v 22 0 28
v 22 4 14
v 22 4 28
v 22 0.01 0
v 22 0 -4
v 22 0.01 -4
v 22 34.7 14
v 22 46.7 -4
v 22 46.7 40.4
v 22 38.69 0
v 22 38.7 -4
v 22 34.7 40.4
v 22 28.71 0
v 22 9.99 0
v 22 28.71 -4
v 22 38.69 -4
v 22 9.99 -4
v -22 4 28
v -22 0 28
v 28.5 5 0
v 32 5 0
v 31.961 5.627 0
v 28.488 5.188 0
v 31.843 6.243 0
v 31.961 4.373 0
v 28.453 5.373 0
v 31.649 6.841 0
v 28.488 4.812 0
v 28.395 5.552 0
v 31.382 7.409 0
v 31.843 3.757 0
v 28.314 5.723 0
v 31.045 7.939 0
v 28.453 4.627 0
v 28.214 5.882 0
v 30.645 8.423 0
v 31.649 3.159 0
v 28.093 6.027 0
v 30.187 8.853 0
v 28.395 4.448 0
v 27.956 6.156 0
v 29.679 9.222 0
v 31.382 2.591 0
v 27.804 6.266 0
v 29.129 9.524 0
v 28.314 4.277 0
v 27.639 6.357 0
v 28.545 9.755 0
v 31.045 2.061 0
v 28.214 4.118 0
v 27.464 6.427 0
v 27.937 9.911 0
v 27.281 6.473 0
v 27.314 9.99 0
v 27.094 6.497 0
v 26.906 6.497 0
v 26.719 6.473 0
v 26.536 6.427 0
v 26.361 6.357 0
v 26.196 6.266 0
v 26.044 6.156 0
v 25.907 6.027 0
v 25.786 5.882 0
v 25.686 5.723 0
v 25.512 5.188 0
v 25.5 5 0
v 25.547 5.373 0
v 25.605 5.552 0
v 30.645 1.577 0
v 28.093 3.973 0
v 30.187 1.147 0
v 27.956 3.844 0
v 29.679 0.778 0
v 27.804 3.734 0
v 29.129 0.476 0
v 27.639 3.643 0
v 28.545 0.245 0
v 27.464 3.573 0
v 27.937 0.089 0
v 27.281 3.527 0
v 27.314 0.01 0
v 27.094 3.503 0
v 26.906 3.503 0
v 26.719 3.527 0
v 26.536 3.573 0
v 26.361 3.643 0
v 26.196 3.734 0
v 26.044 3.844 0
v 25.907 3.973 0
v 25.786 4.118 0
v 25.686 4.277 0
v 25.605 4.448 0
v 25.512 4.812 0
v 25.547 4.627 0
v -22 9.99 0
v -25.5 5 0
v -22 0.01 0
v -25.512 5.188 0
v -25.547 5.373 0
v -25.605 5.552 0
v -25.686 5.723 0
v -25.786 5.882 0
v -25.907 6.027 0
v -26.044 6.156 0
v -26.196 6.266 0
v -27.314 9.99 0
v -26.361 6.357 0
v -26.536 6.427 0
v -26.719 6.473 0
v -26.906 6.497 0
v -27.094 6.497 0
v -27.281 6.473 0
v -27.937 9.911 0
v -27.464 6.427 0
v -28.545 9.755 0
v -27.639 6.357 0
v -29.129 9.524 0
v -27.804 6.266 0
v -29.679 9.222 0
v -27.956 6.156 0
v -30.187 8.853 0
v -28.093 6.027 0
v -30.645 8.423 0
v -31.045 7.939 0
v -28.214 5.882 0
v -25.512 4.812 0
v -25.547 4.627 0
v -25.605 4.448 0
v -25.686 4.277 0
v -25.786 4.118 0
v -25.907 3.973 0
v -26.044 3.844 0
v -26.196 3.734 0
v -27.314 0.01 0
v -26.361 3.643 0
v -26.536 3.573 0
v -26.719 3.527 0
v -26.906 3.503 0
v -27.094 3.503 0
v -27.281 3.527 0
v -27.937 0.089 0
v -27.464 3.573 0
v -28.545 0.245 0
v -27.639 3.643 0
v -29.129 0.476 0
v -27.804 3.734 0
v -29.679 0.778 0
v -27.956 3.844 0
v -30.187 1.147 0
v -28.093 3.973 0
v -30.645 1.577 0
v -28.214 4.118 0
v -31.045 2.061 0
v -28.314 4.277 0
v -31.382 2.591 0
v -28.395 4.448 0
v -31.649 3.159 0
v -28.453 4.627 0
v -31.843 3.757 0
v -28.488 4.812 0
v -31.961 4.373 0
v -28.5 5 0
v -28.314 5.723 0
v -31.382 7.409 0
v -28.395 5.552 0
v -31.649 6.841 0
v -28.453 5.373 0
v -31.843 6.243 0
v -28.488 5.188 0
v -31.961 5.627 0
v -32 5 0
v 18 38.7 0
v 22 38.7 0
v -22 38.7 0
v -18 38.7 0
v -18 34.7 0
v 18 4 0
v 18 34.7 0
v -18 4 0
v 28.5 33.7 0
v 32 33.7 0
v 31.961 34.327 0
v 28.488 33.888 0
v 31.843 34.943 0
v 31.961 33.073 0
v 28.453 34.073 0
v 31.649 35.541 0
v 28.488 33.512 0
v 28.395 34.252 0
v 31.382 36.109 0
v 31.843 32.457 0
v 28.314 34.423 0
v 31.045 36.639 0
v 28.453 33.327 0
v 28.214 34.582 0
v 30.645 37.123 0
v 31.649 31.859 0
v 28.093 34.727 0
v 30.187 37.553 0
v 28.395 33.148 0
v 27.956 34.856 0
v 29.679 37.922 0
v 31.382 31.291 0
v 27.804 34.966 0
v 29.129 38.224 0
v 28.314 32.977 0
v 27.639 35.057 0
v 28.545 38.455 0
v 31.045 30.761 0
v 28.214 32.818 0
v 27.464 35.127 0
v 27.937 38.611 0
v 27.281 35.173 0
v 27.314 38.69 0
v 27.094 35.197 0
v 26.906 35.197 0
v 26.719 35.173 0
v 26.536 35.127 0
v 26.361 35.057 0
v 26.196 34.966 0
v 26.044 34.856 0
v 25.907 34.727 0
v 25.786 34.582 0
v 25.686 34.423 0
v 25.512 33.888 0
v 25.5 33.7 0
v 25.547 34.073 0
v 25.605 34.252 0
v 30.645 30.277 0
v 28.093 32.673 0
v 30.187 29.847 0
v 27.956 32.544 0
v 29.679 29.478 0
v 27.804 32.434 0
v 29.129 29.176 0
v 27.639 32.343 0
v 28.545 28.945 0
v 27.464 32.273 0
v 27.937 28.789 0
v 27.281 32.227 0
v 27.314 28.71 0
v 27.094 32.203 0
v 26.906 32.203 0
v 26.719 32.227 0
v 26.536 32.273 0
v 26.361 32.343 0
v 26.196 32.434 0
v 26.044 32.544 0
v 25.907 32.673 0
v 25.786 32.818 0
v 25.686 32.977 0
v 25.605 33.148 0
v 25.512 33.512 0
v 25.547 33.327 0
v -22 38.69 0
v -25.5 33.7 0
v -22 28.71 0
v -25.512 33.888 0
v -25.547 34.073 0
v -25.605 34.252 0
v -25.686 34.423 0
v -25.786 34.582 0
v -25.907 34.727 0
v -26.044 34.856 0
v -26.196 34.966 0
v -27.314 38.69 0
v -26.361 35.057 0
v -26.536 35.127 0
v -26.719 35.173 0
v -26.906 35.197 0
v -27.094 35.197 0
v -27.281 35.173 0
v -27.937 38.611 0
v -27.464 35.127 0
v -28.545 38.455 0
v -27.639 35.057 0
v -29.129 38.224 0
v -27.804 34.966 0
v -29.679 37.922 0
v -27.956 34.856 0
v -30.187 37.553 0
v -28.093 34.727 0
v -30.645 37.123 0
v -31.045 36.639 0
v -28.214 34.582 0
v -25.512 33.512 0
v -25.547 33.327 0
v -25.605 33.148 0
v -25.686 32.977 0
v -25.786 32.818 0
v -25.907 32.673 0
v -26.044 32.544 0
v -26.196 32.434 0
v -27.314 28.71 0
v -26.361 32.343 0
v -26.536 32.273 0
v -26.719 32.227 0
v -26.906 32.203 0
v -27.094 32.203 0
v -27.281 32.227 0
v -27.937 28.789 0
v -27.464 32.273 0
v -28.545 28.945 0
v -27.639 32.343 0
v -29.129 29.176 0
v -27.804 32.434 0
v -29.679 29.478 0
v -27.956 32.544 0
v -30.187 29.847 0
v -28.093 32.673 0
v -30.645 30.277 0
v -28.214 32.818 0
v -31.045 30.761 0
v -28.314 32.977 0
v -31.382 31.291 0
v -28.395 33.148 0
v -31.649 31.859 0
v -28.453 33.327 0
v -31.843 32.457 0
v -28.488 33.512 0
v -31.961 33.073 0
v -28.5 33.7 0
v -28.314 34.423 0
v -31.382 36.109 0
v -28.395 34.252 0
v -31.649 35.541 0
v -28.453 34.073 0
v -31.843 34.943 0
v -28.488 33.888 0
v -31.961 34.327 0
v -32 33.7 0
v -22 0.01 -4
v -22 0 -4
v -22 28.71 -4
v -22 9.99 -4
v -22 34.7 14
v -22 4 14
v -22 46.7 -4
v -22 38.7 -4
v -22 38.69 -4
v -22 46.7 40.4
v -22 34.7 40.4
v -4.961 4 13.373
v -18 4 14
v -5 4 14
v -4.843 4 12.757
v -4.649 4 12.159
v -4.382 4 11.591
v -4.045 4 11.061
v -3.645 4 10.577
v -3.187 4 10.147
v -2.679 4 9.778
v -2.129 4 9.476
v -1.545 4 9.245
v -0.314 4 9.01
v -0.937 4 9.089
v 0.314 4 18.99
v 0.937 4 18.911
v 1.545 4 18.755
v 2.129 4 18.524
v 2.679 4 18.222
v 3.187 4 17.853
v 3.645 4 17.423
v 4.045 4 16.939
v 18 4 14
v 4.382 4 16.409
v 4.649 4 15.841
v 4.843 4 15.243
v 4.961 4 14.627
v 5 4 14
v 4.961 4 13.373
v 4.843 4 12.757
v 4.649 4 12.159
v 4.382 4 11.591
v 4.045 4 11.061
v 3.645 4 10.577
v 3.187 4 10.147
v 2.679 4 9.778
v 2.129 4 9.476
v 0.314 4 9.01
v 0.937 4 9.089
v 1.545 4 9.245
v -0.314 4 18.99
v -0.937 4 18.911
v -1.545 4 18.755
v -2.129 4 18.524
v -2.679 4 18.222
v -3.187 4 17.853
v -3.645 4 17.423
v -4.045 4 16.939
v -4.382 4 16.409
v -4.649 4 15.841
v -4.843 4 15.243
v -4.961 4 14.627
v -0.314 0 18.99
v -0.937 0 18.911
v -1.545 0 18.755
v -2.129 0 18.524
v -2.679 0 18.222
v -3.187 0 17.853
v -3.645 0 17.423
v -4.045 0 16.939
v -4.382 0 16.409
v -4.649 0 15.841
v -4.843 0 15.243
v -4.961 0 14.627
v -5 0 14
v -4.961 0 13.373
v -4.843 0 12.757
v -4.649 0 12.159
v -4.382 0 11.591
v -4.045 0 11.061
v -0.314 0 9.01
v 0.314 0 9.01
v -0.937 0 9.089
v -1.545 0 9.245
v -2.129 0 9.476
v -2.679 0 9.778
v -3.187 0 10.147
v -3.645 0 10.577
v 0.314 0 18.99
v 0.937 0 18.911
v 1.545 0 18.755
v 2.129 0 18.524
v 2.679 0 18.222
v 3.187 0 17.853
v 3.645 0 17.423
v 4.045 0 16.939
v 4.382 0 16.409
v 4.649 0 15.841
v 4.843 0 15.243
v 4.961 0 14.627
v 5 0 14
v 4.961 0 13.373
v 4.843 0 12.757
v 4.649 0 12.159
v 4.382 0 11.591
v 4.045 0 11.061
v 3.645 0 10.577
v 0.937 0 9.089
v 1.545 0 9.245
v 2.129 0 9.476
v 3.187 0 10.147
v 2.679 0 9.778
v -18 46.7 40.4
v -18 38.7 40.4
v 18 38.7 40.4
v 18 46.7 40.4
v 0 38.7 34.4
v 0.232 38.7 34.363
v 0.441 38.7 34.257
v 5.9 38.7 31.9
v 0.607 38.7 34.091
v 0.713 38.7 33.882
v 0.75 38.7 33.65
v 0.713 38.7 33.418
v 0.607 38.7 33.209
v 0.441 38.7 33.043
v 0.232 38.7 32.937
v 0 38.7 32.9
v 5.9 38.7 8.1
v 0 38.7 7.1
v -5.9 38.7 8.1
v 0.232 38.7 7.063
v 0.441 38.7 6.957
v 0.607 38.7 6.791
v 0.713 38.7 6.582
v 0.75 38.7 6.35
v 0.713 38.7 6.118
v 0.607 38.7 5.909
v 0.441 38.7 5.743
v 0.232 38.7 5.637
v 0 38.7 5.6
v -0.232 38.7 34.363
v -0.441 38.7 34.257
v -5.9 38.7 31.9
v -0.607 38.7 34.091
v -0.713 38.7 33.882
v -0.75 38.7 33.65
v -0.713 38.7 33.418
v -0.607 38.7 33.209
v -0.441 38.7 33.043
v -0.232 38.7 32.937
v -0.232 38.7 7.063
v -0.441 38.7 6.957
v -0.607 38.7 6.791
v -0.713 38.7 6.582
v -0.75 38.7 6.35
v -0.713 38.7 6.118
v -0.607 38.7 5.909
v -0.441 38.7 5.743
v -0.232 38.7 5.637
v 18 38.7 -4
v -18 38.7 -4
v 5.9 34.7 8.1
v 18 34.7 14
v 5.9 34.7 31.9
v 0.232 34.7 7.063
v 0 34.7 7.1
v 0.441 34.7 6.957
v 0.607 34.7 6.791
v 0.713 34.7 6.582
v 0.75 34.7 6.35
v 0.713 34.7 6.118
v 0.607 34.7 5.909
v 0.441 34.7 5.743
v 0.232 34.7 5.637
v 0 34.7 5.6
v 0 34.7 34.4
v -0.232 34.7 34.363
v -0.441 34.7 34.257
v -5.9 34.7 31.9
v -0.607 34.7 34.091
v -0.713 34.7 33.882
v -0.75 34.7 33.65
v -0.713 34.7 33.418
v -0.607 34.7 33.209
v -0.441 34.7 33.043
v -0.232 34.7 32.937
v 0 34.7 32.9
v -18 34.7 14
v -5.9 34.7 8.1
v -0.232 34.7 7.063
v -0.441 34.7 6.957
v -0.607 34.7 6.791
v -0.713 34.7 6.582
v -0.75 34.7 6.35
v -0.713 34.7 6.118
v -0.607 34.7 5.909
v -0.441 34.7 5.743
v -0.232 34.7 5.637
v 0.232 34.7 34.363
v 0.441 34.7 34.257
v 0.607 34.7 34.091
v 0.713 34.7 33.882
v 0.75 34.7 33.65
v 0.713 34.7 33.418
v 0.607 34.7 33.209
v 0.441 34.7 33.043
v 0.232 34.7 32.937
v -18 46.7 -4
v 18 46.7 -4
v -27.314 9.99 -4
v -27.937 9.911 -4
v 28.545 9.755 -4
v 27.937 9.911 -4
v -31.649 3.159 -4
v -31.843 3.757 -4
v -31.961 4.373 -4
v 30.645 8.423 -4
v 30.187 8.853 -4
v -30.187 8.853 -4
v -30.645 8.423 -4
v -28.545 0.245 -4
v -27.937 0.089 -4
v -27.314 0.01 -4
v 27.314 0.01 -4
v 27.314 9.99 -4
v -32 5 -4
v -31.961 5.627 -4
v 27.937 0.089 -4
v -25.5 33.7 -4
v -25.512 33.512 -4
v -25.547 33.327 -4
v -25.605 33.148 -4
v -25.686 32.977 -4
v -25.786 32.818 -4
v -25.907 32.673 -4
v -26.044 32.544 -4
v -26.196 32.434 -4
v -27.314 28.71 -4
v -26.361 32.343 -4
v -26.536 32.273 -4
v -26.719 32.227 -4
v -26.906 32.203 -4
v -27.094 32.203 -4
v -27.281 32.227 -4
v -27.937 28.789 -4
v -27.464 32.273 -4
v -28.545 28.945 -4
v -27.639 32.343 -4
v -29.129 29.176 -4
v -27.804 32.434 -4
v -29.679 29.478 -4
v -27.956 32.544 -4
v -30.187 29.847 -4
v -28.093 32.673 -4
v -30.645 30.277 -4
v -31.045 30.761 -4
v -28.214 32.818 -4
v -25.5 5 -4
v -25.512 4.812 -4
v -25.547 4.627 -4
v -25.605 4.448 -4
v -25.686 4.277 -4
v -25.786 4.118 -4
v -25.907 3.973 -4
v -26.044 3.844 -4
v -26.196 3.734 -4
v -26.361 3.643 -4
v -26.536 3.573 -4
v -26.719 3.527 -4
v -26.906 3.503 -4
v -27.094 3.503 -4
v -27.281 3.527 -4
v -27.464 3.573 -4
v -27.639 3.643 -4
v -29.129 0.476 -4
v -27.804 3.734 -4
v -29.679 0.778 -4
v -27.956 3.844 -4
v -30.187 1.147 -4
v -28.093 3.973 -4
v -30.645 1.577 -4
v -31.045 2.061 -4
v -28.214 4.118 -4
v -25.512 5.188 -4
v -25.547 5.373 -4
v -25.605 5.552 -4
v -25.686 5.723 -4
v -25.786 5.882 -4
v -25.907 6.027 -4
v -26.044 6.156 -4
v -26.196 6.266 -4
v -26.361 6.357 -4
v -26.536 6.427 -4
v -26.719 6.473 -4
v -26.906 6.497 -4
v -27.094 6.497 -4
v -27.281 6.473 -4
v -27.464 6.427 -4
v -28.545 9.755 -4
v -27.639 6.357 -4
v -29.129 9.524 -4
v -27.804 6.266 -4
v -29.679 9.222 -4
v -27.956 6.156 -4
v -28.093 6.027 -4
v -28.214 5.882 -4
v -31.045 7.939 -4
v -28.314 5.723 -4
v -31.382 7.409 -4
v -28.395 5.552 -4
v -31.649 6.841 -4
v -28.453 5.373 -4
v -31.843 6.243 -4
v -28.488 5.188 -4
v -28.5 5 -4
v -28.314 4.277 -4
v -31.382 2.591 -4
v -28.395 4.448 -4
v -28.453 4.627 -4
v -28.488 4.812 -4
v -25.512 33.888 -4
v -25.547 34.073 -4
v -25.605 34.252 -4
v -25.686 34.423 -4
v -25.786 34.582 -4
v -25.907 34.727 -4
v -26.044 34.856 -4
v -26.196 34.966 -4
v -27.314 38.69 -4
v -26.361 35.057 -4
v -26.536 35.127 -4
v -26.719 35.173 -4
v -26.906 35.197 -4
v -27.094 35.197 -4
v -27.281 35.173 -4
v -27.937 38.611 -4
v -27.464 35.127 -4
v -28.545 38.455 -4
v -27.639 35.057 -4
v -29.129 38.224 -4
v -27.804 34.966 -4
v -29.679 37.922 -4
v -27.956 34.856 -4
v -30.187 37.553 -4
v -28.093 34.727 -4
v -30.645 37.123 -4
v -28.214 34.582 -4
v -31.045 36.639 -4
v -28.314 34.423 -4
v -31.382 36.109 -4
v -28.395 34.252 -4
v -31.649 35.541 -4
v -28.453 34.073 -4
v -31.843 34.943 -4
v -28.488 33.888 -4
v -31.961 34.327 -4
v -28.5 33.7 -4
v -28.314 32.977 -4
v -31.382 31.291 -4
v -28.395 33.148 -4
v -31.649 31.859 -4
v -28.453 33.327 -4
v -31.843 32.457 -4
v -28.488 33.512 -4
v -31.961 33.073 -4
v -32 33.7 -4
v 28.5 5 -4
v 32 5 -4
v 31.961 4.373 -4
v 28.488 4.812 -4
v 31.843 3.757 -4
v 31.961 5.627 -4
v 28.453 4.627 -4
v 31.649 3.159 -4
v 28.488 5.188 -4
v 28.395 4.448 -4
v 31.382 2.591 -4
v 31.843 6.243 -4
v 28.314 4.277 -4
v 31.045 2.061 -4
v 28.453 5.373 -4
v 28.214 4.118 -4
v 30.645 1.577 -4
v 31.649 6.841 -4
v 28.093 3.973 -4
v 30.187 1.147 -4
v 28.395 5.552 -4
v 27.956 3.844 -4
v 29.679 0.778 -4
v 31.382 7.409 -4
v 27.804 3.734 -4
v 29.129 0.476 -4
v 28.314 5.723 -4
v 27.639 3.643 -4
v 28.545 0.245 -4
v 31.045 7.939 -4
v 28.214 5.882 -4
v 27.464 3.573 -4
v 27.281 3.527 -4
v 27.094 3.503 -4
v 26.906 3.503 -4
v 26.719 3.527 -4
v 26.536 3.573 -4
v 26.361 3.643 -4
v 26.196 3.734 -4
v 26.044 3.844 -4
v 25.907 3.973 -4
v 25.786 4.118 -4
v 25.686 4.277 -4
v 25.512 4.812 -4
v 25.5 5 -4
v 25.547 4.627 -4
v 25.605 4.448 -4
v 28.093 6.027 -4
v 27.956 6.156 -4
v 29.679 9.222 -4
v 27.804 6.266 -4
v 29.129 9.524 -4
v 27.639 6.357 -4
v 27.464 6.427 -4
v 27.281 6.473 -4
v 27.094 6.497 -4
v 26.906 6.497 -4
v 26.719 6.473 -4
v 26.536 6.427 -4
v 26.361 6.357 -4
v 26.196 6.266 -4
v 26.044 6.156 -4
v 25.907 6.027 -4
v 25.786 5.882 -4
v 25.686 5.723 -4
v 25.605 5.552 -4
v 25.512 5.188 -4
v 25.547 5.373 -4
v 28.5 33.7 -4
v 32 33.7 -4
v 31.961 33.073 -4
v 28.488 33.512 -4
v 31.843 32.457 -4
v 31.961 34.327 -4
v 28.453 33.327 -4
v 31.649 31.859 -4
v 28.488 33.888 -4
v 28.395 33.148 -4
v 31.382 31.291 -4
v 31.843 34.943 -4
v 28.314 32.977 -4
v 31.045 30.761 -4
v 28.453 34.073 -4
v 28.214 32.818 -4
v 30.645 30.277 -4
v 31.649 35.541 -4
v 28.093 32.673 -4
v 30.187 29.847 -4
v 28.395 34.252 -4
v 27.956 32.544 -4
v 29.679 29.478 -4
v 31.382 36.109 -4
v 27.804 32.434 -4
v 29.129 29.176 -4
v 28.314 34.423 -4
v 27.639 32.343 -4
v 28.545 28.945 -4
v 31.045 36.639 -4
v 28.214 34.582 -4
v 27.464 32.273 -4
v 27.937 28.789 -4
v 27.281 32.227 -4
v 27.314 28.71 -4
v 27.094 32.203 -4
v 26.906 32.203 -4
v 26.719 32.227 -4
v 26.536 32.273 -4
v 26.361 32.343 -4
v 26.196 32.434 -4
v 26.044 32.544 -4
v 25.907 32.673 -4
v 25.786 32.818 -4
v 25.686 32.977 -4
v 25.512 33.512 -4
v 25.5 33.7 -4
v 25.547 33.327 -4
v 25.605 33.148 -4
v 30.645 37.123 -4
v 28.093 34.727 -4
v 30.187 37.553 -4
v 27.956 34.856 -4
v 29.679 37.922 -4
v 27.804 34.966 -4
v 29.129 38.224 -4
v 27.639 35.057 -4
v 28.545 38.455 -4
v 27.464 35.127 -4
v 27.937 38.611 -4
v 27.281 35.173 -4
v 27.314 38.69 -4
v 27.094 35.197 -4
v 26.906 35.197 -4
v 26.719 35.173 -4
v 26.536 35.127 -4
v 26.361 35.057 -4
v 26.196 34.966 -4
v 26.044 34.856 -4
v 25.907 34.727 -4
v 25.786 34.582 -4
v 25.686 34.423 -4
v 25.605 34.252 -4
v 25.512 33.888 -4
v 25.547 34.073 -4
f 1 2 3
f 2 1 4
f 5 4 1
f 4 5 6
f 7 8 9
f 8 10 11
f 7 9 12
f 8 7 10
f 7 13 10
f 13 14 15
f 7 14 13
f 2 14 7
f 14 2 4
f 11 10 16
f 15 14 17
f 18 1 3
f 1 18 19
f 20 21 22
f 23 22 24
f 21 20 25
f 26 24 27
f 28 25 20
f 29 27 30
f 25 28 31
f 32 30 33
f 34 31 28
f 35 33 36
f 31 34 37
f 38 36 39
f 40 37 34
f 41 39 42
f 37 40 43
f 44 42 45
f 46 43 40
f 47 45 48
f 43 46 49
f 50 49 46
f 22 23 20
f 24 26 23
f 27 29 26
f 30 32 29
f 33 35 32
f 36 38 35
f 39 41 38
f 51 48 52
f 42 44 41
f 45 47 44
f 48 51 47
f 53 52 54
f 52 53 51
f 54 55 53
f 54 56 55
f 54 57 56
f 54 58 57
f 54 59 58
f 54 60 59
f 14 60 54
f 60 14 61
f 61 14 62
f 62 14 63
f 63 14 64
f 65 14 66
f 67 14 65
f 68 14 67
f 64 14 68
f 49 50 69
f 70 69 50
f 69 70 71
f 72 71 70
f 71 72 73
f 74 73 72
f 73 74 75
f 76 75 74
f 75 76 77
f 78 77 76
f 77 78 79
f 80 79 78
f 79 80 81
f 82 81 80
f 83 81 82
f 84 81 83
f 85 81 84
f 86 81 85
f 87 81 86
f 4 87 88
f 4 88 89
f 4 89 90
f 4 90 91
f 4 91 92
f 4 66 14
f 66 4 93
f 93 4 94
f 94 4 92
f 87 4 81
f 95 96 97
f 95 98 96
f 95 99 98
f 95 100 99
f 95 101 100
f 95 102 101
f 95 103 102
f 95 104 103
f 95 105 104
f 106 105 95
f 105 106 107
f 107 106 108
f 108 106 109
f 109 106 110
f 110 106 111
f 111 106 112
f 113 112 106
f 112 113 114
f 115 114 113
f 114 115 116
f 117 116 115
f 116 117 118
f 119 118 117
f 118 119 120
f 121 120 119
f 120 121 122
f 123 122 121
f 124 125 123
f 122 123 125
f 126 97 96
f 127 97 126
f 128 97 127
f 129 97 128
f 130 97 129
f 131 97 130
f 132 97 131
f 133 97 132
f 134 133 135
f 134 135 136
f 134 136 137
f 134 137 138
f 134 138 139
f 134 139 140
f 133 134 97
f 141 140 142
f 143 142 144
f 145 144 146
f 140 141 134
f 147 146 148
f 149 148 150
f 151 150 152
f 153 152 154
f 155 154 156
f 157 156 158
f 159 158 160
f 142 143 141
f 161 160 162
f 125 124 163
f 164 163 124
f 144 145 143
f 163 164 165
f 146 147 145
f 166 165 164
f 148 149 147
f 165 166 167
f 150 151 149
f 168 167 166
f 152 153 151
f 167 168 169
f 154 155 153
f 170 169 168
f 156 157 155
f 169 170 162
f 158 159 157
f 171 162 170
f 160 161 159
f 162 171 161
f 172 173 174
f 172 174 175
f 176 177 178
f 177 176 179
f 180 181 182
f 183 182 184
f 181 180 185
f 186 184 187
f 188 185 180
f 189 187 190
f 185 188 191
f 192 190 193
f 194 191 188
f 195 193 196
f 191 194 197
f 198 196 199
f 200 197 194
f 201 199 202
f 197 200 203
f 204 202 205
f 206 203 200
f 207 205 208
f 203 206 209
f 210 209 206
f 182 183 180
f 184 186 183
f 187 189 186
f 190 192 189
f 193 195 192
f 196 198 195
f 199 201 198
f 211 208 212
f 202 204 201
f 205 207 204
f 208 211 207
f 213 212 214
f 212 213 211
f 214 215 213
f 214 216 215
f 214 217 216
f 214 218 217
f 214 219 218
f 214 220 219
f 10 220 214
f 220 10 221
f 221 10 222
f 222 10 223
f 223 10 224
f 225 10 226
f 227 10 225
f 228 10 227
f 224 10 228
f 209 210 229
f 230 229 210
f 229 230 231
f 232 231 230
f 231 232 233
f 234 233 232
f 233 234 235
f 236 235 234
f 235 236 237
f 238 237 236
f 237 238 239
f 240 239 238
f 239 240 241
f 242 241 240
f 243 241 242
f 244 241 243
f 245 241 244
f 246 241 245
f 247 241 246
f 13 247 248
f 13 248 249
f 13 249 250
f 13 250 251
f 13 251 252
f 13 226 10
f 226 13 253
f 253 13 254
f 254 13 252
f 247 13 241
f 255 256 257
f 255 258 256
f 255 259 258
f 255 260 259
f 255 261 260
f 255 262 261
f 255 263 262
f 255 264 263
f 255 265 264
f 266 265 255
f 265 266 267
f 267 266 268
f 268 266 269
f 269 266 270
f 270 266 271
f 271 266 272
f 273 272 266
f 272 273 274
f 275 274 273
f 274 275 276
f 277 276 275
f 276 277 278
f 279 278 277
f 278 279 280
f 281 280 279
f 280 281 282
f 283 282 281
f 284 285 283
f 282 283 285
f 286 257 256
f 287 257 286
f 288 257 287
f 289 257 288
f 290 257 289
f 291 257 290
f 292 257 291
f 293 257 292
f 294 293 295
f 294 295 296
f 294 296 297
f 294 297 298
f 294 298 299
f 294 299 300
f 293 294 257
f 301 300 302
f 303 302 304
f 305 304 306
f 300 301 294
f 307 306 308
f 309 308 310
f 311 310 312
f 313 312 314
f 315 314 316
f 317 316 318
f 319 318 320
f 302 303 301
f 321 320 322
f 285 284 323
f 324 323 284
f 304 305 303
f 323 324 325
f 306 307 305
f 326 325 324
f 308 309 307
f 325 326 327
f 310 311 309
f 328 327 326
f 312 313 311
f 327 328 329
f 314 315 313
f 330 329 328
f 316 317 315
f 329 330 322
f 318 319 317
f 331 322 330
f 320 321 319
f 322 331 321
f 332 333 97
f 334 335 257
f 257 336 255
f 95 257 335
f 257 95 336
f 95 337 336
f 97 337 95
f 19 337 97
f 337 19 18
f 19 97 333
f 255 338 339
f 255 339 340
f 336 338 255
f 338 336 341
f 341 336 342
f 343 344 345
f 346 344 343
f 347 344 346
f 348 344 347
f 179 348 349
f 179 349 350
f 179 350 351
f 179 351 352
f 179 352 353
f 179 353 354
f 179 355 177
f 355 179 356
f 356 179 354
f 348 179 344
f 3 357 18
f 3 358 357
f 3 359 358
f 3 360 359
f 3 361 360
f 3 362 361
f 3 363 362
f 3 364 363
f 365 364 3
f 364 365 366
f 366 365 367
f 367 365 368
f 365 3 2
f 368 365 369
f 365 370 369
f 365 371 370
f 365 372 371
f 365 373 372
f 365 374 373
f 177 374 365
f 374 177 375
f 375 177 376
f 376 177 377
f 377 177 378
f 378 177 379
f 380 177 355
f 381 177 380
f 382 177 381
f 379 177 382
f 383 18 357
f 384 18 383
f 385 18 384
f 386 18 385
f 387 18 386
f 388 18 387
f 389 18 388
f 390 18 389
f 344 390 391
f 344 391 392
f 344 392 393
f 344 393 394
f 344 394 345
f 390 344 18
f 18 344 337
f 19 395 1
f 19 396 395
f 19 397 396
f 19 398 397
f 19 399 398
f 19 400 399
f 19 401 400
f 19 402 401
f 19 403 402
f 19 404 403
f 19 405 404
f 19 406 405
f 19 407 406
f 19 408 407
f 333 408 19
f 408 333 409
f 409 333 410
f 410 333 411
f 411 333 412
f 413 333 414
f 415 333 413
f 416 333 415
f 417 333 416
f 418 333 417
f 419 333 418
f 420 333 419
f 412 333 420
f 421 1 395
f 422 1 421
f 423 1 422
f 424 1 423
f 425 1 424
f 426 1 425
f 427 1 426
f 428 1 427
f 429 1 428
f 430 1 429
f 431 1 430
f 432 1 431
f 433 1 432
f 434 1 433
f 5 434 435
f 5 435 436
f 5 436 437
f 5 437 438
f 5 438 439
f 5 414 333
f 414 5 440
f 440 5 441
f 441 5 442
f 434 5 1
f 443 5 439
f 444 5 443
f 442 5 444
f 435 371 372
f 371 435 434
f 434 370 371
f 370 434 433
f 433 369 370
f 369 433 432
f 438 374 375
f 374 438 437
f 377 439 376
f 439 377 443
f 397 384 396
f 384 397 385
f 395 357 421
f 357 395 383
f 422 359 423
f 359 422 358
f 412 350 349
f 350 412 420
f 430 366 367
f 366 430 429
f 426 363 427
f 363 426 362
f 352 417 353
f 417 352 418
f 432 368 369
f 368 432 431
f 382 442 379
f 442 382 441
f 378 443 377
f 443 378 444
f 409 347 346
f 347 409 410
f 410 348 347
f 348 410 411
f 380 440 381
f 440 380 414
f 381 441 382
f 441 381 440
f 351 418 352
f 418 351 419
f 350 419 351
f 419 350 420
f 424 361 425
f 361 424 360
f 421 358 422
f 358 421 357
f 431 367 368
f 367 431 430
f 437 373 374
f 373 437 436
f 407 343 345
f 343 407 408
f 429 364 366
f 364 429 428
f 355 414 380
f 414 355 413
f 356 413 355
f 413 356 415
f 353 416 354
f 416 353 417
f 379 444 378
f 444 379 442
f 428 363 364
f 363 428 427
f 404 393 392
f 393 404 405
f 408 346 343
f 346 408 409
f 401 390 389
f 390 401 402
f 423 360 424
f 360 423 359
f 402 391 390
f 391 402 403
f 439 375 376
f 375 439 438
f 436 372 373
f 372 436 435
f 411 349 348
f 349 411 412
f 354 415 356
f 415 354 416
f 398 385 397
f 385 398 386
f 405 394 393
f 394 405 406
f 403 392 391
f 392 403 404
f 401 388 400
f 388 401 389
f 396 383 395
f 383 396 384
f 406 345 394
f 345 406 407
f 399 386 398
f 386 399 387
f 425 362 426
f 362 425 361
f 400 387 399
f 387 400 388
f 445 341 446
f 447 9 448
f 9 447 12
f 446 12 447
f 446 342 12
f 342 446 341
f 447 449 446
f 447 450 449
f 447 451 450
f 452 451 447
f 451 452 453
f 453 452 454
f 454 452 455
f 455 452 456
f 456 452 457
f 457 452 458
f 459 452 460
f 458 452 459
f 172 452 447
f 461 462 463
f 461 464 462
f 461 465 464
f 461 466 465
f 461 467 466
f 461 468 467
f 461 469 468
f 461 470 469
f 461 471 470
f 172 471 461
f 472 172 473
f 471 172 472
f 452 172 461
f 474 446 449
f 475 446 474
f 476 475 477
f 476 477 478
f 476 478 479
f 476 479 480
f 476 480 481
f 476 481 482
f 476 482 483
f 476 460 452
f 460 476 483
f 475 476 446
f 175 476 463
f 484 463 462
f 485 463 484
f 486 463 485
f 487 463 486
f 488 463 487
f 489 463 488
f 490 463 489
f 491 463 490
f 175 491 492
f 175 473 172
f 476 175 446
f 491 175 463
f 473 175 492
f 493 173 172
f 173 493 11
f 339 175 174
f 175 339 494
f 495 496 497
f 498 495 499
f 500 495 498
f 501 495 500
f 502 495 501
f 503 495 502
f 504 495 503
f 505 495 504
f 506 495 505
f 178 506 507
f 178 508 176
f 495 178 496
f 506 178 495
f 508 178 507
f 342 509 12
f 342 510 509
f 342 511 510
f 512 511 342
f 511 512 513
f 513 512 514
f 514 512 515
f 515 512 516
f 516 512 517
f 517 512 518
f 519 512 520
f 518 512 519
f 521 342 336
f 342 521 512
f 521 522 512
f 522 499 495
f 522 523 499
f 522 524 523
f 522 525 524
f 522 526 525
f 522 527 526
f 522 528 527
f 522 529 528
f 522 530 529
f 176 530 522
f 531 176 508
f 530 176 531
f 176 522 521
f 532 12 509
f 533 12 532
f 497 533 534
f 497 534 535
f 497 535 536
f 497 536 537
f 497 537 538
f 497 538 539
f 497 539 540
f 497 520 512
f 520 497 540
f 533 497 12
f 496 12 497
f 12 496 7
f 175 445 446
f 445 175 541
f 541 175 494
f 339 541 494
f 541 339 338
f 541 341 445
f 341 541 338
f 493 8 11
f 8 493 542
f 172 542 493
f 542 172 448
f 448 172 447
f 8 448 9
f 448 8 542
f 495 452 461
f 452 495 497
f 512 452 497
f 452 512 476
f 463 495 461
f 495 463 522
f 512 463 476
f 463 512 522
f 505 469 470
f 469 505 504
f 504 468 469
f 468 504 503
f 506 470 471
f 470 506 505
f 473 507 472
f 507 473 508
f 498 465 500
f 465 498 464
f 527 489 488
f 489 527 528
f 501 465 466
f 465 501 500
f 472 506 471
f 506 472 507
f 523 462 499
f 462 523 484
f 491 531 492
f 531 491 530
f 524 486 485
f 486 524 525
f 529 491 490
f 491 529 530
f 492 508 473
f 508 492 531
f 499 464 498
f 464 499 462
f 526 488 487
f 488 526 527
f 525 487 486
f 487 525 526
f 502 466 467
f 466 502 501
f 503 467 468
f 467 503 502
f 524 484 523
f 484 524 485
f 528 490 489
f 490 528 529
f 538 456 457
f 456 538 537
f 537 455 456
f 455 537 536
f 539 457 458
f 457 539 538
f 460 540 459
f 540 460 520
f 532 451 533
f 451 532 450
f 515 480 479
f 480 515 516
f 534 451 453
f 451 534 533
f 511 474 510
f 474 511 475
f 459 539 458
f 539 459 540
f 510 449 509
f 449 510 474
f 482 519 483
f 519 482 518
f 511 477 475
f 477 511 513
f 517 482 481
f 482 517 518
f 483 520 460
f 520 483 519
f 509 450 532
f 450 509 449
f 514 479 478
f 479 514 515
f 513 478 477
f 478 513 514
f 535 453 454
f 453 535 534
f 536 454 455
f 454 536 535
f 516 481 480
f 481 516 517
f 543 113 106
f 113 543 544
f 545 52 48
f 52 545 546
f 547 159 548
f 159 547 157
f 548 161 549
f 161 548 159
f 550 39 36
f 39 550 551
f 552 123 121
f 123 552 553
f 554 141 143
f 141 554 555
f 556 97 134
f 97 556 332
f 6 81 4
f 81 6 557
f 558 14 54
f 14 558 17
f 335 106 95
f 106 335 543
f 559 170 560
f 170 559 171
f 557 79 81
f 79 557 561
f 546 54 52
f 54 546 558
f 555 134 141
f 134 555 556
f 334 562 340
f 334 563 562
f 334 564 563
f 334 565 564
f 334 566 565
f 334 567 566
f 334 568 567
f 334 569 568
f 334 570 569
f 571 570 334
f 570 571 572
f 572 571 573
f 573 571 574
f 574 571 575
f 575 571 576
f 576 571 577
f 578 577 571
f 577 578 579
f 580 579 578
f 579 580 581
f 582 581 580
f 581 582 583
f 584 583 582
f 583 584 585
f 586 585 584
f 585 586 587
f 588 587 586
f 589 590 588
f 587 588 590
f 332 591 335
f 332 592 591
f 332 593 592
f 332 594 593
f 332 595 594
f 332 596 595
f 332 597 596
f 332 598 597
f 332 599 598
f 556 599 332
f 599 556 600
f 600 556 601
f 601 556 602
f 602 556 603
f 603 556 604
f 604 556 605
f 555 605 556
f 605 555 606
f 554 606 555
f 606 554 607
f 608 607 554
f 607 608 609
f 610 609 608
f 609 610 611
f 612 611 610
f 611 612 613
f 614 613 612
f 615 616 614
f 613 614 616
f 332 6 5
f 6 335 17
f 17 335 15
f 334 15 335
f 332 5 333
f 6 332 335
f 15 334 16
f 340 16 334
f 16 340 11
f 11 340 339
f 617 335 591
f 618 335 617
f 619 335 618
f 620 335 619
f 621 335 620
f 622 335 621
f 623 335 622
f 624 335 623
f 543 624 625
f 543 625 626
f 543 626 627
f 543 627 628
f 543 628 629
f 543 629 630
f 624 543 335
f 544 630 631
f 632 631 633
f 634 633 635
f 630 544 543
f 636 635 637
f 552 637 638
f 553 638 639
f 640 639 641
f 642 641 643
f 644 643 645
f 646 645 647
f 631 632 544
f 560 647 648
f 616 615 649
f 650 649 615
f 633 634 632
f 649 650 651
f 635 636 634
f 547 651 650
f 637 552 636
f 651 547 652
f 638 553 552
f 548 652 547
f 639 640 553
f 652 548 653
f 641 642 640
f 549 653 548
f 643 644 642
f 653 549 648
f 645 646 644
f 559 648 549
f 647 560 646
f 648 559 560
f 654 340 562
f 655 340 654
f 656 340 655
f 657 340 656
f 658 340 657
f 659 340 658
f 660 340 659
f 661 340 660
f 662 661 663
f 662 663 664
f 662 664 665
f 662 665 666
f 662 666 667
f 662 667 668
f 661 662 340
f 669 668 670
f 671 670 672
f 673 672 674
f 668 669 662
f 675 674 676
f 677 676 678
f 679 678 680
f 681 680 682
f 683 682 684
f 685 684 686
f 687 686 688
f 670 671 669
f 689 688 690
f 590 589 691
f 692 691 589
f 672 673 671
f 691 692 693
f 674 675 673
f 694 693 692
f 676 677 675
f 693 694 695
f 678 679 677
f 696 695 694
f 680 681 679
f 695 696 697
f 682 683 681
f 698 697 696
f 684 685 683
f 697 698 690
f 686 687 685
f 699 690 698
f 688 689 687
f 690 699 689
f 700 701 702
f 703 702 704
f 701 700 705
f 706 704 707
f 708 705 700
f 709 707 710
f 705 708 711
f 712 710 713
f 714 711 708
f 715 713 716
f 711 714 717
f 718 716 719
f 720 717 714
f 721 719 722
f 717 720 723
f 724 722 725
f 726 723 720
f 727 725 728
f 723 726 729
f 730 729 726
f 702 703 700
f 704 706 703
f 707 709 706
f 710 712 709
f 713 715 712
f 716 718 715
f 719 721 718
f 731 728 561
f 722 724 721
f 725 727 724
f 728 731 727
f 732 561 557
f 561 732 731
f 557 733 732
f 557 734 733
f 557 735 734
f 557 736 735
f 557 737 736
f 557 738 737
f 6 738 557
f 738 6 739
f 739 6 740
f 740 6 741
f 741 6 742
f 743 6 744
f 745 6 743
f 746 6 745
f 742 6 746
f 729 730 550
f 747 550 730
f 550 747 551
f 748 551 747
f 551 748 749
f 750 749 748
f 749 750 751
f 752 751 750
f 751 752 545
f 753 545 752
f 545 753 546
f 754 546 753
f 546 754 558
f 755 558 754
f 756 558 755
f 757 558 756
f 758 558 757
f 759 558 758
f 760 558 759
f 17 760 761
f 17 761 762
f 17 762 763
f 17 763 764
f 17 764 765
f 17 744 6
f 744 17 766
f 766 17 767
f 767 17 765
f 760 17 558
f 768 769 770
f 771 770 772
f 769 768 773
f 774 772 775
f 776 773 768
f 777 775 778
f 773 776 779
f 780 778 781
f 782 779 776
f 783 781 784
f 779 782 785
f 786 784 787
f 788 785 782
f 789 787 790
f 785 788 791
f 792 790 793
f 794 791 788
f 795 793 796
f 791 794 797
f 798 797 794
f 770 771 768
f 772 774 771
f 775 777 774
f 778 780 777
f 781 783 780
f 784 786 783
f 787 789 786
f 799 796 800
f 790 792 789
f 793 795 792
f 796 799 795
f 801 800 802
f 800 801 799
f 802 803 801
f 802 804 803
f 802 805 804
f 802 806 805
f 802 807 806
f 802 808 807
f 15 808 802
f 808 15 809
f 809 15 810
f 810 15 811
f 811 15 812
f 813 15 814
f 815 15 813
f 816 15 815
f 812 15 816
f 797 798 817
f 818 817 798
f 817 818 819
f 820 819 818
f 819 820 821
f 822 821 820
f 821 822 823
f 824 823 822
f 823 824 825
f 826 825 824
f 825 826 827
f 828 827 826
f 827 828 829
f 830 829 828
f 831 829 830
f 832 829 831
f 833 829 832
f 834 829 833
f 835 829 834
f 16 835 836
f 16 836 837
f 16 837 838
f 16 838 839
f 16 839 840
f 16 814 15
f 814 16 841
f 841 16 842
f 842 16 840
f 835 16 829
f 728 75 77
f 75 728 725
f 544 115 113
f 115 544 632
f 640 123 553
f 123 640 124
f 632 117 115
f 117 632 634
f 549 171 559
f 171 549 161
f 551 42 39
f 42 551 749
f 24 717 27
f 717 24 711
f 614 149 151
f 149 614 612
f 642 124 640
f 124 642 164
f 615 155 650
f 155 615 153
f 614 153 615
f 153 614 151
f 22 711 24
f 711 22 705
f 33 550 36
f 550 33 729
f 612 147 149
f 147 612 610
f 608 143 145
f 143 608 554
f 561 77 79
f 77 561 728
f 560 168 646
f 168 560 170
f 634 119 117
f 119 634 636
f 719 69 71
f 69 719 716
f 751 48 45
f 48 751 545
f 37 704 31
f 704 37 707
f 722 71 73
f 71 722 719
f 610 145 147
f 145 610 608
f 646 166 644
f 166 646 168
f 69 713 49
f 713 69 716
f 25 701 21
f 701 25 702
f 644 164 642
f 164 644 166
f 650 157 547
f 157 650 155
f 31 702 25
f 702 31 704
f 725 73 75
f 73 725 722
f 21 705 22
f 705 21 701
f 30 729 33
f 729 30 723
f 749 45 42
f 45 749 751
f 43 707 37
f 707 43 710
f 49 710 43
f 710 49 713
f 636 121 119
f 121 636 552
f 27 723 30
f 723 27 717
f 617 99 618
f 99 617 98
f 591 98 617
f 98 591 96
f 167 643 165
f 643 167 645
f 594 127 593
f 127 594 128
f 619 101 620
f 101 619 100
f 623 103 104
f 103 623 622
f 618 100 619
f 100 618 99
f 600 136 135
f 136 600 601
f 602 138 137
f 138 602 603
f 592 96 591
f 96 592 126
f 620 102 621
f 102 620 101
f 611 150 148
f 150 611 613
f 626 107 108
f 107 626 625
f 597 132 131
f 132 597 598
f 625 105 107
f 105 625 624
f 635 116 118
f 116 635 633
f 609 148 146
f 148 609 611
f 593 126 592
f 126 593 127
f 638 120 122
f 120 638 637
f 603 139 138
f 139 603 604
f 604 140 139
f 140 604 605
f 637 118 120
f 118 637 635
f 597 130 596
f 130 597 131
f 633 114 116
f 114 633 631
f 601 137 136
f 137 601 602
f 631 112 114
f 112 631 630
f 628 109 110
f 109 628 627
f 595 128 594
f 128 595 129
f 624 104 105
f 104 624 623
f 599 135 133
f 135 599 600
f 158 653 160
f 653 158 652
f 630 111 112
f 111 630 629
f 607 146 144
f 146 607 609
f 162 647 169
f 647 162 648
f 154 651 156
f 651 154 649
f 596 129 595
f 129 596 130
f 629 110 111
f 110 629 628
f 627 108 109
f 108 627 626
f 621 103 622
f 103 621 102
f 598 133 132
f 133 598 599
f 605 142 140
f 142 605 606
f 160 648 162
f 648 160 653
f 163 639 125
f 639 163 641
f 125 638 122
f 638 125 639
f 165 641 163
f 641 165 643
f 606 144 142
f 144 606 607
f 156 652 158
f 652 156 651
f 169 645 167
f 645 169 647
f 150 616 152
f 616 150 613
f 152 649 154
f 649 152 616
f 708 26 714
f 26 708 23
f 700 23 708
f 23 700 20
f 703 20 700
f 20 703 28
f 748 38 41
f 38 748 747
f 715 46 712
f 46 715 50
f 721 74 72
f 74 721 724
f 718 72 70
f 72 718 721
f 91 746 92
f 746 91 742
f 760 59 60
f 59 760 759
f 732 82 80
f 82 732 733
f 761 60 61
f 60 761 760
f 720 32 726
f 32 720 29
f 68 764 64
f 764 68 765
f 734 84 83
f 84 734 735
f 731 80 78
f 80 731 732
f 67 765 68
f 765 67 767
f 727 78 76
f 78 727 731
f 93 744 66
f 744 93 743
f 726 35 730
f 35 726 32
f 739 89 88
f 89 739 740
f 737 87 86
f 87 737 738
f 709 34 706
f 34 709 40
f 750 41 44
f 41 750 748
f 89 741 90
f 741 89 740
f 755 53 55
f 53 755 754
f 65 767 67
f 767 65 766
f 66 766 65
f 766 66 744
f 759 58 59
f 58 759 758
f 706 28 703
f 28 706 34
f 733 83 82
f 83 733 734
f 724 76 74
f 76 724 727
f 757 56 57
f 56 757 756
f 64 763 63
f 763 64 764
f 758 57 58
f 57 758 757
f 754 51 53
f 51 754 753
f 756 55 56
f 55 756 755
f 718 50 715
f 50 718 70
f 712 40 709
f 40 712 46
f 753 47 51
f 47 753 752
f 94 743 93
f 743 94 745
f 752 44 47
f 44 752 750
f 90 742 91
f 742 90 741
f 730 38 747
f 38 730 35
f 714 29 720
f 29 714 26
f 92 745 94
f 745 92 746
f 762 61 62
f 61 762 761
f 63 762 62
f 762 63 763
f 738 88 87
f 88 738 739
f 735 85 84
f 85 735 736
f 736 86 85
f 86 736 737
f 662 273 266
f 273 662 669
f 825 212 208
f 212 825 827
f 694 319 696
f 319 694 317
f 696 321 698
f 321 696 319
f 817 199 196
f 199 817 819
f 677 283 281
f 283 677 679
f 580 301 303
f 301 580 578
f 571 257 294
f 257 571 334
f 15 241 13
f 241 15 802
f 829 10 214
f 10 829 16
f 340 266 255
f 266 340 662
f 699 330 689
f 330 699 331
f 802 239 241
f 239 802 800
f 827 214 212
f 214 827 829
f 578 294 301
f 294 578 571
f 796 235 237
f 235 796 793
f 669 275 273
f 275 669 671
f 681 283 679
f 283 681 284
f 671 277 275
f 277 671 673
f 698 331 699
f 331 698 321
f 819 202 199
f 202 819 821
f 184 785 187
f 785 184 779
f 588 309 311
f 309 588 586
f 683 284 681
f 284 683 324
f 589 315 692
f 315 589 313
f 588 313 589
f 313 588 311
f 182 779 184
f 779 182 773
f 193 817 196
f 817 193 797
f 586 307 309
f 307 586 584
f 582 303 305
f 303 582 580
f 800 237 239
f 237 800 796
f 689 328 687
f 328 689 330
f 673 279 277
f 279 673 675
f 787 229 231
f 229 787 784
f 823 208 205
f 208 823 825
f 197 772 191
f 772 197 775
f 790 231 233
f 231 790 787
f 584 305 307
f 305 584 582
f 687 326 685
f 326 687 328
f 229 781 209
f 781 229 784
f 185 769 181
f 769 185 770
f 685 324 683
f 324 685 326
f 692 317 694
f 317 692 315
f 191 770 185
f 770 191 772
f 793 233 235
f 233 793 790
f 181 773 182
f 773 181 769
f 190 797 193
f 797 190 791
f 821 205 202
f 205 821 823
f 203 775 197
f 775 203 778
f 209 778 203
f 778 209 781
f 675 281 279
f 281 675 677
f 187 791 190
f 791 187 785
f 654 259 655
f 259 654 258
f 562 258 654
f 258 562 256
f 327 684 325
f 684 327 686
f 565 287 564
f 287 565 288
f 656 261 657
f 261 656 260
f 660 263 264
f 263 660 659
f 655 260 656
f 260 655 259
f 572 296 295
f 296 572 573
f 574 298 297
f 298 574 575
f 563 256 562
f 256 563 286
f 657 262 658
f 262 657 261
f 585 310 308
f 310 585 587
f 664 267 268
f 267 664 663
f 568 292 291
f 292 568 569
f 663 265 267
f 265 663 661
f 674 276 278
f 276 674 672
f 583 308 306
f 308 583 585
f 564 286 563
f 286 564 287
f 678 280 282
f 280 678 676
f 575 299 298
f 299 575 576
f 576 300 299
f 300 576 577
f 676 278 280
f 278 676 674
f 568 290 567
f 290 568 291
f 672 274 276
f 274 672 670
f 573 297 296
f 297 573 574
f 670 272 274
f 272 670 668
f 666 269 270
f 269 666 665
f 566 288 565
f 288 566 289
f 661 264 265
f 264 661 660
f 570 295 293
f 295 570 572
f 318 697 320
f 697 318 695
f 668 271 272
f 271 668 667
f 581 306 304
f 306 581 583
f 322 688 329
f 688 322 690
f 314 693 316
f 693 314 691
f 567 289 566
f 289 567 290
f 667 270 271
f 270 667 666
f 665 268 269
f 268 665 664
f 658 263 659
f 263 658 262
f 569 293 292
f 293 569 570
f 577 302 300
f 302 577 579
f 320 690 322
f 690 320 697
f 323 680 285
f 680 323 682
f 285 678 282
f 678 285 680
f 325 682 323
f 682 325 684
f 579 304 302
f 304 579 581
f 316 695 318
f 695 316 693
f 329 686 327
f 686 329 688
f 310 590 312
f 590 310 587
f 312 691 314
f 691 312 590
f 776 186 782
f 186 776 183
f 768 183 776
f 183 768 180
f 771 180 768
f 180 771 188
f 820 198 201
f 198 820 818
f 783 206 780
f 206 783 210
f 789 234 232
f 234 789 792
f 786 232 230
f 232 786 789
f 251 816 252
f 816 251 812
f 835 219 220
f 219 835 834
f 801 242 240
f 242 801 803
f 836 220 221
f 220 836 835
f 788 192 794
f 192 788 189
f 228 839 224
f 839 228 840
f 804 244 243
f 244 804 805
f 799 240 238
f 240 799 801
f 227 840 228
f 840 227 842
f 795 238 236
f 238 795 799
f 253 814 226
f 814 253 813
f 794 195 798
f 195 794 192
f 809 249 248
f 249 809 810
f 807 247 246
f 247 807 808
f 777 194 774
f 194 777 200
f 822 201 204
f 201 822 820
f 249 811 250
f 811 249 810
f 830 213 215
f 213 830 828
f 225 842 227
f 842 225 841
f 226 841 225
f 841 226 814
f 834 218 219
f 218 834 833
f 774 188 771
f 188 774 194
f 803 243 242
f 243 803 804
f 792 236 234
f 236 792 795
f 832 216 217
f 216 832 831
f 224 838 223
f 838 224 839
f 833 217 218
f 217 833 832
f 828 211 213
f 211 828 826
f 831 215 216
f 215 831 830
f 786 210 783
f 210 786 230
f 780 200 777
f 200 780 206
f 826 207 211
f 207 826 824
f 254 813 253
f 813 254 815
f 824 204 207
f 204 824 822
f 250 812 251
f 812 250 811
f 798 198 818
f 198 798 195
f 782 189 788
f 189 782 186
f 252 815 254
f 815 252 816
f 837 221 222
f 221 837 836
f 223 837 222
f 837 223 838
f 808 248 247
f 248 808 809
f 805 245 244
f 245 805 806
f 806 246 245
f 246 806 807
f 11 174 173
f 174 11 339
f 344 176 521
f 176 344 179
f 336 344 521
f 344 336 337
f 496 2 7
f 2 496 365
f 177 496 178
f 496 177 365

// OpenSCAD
potBodyRadius = 28.0 / 2;
potThreadRadius = 10 / 2;
potThreadLength = 10.0;
potShaftRadius = 6.5 / 2; //6.0 / 2;
potShaftLength = 12.0;

servoBodyWidth = 11.8;
servoBodyLength = 23.8;
servoBodyDepth = 3.6;
servoBossDepth = 5.1;
servoShaftRadius = 4.15 / 2; //4.05 / 2;
servoShaftLength = 3.0;
servoTabLength = 4.5;
servoTabHoleOffset = 1.0;
servoTabHoleRadius = 1.5 / 2;

servoChassisSupportBraceWidth = 8.0;

chassisWallThickness = 4.0;
chassisBezelWidth = 6.0;

couplerWallThickness = 5.0;
couplerGrubScrewRadius = 2.5 / 2;


chassisTabRadius = 5;
chassisTabHoleRadius = 3.0 / 2;
chassisMinWidthBetweenWalls = 36.0;


chassisLength = potThreadLength + potShaftLength + couplerWallThickness + servoBodyDepth + servoBossDepth + servoShaftLength;
chassisWidth = max(chassisMinWidthBetweenWalls + 2 * chassisWallThickness, potBodyRadius * 2, servoBodyWidth + 2 * chassisBezelWidth);

axisHeight = max(potBodyRadius, servoBodyWidth / 2 + servoTabLength);

couplerLength = potShaftLength + couplerWallThickness + servoShaftLength;
couplerRadius = max(potShaftRadius, servoShaftRadius) + couplerWallThickness;


echo(str("Tab hole separations: ", chassisWidth + chassisTabRadius * 2, " x ", chassisLength - 2 * chassisTabRadius, " mm"));


//CouplerTest();

//Coupler();
Chassis();

module CouplerTest() {
  tests = [ for (i = [-2:2]) i ];
  difference() {
    translate([0, -couplerRadius, -1]) {
      cube([couplerRadius * (1 + len(tests)), couplerRadius * 2, 1 + servoShaftLength]);
    }
  
    for (i = tests) {
      translate([couplerRadius * (1 + i - min(tests)), 0, 0]) {
        cylinder(servoShaftLength + 0.001, servoShaftRadius + i * 0.025, servoShaftRadius + i * 0.025, $fn = 50);
      }
    }
    
    cylinder(servoShaftLength + 0.001, 1, 1, $fn=20);
  }
}

module Coupler() {
  difference() {
    cylinder(couplerLength, couplerRadius, couplerRadius, $fn = 50);
    
    // Pot shaft
    cylinder(potShaftLength, potShaftRadius, potShaftRadius, $fn = 50);
    
    // Servo shaft
    translate([0, 0, potShaftLength + couplerWallThickness]) {
      cylinder(servoShaftLength, servoShaftRadius, servoShaftRadius, $fn = 50);
    }
    
    // Pot grub screw
    translate([0, 0, potShaftLength / 2])
    rotate([90, 0, 0])
    cylinder(couplerRadius, couplerGrubScrewRadius, couplerGrubScrewRadius, $fn = 25);
  }
}

module Chassis() {
  // Pot wall
  difference() {
    translate([-chassisWidth / 2, 0, 0]) {
      cube([chassisWidth, chassisWallThickness, axisHeight + potBodyRadius]);
    }
    
    // Pot thread
    translate([0, 0, axisHeight]) {
      rotate([-90, 0, 0]) {
        translate([0, 0, chassisWallThickness / 2]) {
          cylinder(chassisWallThickness + 0.01, potThreadRadius, potThreadRadius, $fn = 50, center = true);
        }
      }
    }
  }
  
  servoWallHeight = axisHeight + servoBodyLength + servoTabLength + chassisWallThickness - servoBodyWidth / 2;

  // Servo wall
  translate([0, chassisLength - chassisWallThickness, 0]) {
    difference() {
      union() {
        translate([-chassisWidth / 2, 0, 0]) {
          cube([chassisWidth, chassisWallThickness, servoWallHeight]);
        }
        
        // Supports
        translate([-chassisWidth / 2, chassisWallThickness, -chassisWallThickness]) {
          cube([chassisWallThickness, servoChassisSupportBraceWidth, servoWallHeight + chassisWallThickness]);
        }
        translate([chassisWidth / 2 - chassisWallThickness, chassisWallThickness, -chassisWallThickness]) {
          cube([chassisWallThickness, servoChassisSupportBraceWidth, servoWallHeight + chassisWallThickness]);
        }
      }
      
      // Servo body
      translate([-servoBodyWidth / 2, -0.01, axisHeight - servoBodyWidth / 2]) {
        cube([servoBodyWidth, chassisWallThickness + 0.02, servoBodyLength]);
      }
      // Servo tab holes
      translate([0, 0, axisHeight - (servoBodyWidth / 2 + servoTabHoleRadius + servoTabHoleOffset)]) {
        rotate([-90, 0, 0]) {
          translate([0, 0, chassisWallThickness / 2]) {
            cylinder(chassisWallThickness + 0.02, servoTabHoleRadius, servoTabHoleRadius, $fn = 20, center = true);
          }
        }
      }
      translate([0, 0, axisHeight + servoBodyLength + servoTabHoleRadius + servoTabHoleOffset - servoBodyWidth / 2]) {
        rotate([-90, 0, 0]) {
          translate([0, 0, chassisWallThickness / 2]) {
            cylinder(chassisWallThickness + 0.02, servoTabHoleRadius, servoTabHoleRadius, $fn = 20, center = true);
          }
        }
      }
    }
  }

  // Floor
  translate([-chassisWidth / 2, 0, -chassisWallThickness]) {
    cube([chassisWidth, chassisLength, chassisWallThickness]);
  }
  
  // Tabs
  translate([0, chassisTabRadius, 0]) {
    ChassisTabsBar();
  }
  translate([0, chassisLength - chassisTabRadius, 0]) {
    ChassisTabsBar();
  }

  // Side walls
  translate([-chassisWidth / 2, 0, 0]) {
    cube([chassisWallThickness, chassisLength, axisHeight]);
  }
  translate([chassisWidth / 2 - chassisWallThickness, 0, 0]) {
    cube([chassisWallThickness, chassisLength, axisHeight]);
  }
}

module ChassisTabsBar() {
  translate([0, 0, -chassisWallThickness]) {
    difference() {
      hull() {
        translate([-(chassisWidth / 2 + chassisTabRadius), 0, 0]) {
          cylinder(chassisWallThickness, chassisTabRadius, chassisTabRadius, $fn = 50);
        }
        translate([chassisWidth / 2 + chassisTabRadius, 0, 0]) {
          cylinder(chassisWallThickness, chassisTabRadius, chassisTabRadius, $fn = 50);
        }
      }
      
      translate([-(chassisWidth / 2 + chassisTabRadius), 0, 0]) {
        cylinder(chassisWallThickness, chassisTabHoleRadius, chassisTabHoleRadius, $fn = 50);
      }
      translate([chassisWidth / 2 + chassisTabRadius, 0, 0]) {
        cylinder(chassisWallThickness, chassisTabHoleRadius, chassisTabHoleRadius, $fn = 50);
      }
    }
  }
}
